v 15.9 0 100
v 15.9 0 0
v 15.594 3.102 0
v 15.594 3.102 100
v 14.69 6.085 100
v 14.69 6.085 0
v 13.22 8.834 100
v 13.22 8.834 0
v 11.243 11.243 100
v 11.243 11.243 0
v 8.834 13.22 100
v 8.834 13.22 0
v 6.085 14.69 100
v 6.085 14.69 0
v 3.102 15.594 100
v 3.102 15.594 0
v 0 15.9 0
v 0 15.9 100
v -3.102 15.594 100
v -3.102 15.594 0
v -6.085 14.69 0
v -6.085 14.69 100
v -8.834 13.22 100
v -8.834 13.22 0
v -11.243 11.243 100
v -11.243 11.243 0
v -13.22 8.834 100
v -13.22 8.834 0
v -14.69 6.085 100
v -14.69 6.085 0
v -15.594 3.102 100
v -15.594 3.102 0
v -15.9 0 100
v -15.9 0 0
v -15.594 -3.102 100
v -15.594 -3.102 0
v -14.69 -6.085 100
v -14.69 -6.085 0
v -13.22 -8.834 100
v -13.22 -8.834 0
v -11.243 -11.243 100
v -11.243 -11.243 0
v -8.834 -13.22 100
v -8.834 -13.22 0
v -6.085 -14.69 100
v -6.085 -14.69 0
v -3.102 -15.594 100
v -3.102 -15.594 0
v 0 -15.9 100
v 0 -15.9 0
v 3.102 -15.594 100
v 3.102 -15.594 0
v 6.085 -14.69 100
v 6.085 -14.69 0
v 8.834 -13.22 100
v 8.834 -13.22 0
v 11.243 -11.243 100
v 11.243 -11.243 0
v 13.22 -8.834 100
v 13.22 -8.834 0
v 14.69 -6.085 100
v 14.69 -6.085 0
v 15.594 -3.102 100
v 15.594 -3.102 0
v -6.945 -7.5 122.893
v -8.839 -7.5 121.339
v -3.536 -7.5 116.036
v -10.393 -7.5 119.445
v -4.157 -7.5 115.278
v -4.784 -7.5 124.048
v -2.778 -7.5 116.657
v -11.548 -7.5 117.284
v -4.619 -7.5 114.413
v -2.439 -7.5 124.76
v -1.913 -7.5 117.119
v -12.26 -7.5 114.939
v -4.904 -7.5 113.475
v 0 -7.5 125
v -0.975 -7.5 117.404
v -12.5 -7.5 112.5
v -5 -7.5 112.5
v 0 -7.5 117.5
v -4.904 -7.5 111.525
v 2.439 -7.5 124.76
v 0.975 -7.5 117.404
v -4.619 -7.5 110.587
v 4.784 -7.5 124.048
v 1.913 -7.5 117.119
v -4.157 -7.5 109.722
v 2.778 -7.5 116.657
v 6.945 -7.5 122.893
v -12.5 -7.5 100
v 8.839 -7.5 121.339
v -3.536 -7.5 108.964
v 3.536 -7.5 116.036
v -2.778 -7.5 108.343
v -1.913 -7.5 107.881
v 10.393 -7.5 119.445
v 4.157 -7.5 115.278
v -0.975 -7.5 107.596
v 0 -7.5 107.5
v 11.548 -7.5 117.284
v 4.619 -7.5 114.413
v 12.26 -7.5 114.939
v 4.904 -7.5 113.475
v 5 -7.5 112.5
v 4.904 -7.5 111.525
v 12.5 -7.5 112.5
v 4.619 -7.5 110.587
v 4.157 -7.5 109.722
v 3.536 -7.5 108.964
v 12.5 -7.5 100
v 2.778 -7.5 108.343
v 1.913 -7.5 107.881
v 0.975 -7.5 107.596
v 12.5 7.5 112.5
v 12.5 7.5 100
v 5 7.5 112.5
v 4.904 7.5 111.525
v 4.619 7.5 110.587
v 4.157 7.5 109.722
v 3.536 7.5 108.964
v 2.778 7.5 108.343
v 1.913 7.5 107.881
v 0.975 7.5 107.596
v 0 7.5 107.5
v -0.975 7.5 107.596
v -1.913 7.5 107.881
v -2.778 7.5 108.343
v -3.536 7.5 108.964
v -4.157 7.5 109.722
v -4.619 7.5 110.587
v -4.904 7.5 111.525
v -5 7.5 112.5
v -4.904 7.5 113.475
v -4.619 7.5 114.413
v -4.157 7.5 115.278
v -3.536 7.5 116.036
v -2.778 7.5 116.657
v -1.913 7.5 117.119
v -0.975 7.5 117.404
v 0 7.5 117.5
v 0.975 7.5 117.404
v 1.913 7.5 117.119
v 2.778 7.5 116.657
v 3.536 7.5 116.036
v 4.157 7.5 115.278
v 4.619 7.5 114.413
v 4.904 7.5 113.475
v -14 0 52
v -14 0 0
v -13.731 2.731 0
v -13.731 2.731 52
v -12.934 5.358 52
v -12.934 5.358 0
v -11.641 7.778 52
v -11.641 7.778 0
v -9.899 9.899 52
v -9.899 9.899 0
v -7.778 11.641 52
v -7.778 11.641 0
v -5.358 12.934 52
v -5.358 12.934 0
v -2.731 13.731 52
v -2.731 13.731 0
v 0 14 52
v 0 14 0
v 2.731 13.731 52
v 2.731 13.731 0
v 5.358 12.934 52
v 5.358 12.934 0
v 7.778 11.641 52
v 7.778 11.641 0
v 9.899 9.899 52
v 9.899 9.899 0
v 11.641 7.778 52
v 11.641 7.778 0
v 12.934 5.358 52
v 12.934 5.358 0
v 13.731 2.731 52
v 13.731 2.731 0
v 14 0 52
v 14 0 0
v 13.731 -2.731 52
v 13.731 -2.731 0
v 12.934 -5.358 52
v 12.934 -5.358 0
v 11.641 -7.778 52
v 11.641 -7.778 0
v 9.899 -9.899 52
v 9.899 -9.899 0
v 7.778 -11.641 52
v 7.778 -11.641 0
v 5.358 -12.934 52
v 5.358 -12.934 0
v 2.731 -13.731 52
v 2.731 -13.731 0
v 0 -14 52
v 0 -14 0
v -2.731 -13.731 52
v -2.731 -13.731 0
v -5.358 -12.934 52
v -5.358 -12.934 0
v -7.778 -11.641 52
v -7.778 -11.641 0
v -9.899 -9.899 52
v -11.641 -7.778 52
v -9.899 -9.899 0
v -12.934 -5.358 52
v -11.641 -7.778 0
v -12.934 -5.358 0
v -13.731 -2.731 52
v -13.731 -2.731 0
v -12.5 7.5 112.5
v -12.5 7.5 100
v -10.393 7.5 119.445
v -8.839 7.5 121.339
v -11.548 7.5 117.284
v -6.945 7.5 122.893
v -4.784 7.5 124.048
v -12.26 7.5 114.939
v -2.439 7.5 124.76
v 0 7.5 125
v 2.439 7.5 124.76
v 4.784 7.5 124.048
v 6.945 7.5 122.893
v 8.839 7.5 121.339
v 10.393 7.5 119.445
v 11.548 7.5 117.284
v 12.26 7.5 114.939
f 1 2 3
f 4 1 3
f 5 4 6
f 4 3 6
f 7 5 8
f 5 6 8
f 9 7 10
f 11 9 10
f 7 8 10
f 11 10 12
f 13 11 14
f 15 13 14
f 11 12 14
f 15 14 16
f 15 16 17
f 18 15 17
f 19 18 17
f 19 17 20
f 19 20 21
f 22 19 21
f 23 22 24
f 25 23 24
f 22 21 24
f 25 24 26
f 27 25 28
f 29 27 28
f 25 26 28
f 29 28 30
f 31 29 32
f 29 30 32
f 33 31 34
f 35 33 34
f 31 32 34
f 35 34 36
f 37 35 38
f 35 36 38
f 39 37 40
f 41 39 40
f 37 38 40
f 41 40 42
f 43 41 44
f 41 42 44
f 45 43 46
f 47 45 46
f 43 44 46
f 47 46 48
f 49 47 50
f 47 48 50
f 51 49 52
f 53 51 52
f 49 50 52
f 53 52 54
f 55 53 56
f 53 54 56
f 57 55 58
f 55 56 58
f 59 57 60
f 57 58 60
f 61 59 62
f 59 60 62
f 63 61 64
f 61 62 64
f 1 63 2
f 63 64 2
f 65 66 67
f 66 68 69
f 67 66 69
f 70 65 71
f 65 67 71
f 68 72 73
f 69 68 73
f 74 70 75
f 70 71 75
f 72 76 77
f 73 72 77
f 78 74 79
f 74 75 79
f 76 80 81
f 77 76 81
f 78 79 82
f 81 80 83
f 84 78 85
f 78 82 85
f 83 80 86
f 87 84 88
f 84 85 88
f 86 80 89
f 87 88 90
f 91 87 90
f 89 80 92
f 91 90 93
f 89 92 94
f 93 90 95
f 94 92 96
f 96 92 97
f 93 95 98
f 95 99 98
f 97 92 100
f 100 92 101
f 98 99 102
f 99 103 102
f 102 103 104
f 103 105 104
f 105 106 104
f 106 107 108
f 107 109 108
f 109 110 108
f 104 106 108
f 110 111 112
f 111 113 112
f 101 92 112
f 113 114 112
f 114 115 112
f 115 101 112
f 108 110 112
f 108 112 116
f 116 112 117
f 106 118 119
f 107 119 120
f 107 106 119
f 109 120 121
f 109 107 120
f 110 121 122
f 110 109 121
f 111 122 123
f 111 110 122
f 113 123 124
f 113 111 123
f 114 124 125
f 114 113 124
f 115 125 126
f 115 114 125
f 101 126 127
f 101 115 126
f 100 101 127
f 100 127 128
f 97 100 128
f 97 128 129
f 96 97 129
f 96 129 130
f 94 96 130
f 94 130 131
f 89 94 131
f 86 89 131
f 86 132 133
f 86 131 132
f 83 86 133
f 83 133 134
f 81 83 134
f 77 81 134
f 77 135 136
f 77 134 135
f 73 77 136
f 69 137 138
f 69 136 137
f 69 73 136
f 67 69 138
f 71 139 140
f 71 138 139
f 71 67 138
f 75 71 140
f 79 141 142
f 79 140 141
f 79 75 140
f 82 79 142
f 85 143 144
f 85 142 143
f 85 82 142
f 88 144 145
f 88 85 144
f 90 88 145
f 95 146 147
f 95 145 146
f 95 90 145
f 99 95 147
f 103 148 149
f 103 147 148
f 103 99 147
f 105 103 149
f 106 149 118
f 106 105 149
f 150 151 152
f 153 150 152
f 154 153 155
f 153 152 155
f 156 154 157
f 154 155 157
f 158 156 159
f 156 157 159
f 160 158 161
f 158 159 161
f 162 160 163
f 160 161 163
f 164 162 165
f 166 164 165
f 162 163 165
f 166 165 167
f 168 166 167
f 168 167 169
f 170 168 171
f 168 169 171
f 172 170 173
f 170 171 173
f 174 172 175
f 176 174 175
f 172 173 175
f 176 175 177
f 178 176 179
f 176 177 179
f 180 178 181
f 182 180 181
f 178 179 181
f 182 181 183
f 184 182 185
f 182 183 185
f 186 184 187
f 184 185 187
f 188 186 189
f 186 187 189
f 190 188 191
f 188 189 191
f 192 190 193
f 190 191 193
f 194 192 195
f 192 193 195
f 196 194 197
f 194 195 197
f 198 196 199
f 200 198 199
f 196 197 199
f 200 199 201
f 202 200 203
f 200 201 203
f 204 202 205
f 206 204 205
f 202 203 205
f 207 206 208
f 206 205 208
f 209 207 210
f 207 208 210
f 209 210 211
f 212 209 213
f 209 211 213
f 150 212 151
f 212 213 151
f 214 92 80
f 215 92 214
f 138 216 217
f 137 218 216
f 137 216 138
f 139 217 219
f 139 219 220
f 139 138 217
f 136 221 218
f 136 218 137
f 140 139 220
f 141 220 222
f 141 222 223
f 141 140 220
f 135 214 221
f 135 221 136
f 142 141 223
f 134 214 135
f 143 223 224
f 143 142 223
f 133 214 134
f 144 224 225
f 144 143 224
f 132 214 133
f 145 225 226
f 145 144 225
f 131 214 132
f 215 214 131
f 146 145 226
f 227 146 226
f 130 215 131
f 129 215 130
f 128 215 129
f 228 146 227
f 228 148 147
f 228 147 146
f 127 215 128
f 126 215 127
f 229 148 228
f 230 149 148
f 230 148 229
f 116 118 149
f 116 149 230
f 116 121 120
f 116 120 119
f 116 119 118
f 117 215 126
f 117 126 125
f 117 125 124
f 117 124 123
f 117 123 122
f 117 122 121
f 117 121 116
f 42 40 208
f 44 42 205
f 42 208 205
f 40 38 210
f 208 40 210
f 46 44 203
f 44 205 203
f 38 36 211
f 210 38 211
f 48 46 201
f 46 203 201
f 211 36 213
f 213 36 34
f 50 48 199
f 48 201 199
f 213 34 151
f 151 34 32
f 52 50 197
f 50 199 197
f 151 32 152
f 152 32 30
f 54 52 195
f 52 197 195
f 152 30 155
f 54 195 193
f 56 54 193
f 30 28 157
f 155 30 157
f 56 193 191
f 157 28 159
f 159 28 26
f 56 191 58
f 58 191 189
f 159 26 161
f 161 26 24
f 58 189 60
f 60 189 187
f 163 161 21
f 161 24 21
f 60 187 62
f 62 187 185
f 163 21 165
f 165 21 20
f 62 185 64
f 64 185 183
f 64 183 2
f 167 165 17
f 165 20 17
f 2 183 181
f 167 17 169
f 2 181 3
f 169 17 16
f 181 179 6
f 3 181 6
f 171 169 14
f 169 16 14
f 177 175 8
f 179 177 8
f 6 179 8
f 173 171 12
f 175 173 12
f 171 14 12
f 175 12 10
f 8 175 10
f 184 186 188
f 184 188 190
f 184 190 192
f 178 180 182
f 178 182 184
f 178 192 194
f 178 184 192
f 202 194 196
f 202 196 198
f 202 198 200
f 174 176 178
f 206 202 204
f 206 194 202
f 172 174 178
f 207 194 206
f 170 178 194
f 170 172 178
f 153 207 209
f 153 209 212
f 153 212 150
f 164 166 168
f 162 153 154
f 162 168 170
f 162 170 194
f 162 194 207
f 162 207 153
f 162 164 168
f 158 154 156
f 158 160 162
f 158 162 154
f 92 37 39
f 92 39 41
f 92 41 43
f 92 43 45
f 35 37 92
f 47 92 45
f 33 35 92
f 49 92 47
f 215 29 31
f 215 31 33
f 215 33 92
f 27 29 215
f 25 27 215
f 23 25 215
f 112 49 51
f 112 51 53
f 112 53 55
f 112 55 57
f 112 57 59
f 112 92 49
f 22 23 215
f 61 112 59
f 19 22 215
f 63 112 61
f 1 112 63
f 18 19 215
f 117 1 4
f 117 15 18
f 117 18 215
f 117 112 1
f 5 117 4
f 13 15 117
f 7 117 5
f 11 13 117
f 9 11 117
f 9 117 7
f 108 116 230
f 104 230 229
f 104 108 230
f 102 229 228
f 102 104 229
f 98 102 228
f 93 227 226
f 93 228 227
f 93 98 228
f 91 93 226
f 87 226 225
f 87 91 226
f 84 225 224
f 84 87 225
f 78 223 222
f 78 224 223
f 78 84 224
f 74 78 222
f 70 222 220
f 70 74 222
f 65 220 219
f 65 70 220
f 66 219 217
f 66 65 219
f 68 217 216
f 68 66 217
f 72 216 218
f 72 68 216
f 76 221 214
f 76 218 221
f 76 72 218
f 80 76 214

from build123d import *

# Parameters (mm, degrees)
SKETCH_1_R          = 15.9
EXTRUDE_1_DEPTH     = 100
SKETCH_2_W          = 25
SKETCH_2_H          = 15
EXTRUDE_2_DEPTH     = 25
SKETCH_3_R          = 5
CUT_EXTRUDE_1_DEPTH = 129.161499679
SKETCH_4_R          = 14
CUT_EXTRUDE_2_DEPTH = 52


with BuildPart() as part:
    # Эскиз1 → Бобышка-Вытянуть1 (new body)
    with BuildSketch(Plane.XY):
        Circle(SKETCH_1_R)
    extrude(amount=EXTRUDE_1_DEPTH)

    # Эскиз2 → Бобышка-Вытянуть2 (add)
    with BuildSketch(Plane.XY.offset(100)):
        Rectangle(SKETCH_2_W, SKETCH_2_H)
    extrude(amount=EXTRUDE_2_DEPTH)

    # Эскиз3 → Вырез-Вытянуть1 (cut, through all)
    with BuildSketch(Plane(origin=(0, -7.5, 0), x_dir=(1, 0, 0), z_dir=(0, 1, 0))):
        with Locations((0, -112.5)):
            Circle(SKETCH_3_R)
        with BuildLine():
            Line((-12.5, -112.5), (-20.699880193, -112.5))
            Line((-20.699880193, -112.5), (-20.699880193, -150.973701631))
            Line((-20.699880193, -150.973701631), (17.84150118, -150.973701631))
            Line((17.84150118, -150.973701631), (17.84150118, -132.5))
            Line((17.84150118, -132.5), (12.5, -112.5))
            ThreePointArc((12.5, -112.5), (0, -125), (-12.5, -112.5))
        make_face()
    extrude(amount=CUT_EXTRUDE_1_DEPTH, mode=Mode.SUBTRACT)

    # Эскиз4 → Вырез-Вытянуть2 (cut)
    with BuildSketch(Plane(origin=(0, 0, 0), x_dir=(-1, 0, 0), z_dir=(0, 0, -1))):
        Circle(SKETCH_4_R)
    extrude(amount=-CUT_EXTRUDE_2_DEPTH, mode=Mode.SUBTRACT)


solid = part.part
